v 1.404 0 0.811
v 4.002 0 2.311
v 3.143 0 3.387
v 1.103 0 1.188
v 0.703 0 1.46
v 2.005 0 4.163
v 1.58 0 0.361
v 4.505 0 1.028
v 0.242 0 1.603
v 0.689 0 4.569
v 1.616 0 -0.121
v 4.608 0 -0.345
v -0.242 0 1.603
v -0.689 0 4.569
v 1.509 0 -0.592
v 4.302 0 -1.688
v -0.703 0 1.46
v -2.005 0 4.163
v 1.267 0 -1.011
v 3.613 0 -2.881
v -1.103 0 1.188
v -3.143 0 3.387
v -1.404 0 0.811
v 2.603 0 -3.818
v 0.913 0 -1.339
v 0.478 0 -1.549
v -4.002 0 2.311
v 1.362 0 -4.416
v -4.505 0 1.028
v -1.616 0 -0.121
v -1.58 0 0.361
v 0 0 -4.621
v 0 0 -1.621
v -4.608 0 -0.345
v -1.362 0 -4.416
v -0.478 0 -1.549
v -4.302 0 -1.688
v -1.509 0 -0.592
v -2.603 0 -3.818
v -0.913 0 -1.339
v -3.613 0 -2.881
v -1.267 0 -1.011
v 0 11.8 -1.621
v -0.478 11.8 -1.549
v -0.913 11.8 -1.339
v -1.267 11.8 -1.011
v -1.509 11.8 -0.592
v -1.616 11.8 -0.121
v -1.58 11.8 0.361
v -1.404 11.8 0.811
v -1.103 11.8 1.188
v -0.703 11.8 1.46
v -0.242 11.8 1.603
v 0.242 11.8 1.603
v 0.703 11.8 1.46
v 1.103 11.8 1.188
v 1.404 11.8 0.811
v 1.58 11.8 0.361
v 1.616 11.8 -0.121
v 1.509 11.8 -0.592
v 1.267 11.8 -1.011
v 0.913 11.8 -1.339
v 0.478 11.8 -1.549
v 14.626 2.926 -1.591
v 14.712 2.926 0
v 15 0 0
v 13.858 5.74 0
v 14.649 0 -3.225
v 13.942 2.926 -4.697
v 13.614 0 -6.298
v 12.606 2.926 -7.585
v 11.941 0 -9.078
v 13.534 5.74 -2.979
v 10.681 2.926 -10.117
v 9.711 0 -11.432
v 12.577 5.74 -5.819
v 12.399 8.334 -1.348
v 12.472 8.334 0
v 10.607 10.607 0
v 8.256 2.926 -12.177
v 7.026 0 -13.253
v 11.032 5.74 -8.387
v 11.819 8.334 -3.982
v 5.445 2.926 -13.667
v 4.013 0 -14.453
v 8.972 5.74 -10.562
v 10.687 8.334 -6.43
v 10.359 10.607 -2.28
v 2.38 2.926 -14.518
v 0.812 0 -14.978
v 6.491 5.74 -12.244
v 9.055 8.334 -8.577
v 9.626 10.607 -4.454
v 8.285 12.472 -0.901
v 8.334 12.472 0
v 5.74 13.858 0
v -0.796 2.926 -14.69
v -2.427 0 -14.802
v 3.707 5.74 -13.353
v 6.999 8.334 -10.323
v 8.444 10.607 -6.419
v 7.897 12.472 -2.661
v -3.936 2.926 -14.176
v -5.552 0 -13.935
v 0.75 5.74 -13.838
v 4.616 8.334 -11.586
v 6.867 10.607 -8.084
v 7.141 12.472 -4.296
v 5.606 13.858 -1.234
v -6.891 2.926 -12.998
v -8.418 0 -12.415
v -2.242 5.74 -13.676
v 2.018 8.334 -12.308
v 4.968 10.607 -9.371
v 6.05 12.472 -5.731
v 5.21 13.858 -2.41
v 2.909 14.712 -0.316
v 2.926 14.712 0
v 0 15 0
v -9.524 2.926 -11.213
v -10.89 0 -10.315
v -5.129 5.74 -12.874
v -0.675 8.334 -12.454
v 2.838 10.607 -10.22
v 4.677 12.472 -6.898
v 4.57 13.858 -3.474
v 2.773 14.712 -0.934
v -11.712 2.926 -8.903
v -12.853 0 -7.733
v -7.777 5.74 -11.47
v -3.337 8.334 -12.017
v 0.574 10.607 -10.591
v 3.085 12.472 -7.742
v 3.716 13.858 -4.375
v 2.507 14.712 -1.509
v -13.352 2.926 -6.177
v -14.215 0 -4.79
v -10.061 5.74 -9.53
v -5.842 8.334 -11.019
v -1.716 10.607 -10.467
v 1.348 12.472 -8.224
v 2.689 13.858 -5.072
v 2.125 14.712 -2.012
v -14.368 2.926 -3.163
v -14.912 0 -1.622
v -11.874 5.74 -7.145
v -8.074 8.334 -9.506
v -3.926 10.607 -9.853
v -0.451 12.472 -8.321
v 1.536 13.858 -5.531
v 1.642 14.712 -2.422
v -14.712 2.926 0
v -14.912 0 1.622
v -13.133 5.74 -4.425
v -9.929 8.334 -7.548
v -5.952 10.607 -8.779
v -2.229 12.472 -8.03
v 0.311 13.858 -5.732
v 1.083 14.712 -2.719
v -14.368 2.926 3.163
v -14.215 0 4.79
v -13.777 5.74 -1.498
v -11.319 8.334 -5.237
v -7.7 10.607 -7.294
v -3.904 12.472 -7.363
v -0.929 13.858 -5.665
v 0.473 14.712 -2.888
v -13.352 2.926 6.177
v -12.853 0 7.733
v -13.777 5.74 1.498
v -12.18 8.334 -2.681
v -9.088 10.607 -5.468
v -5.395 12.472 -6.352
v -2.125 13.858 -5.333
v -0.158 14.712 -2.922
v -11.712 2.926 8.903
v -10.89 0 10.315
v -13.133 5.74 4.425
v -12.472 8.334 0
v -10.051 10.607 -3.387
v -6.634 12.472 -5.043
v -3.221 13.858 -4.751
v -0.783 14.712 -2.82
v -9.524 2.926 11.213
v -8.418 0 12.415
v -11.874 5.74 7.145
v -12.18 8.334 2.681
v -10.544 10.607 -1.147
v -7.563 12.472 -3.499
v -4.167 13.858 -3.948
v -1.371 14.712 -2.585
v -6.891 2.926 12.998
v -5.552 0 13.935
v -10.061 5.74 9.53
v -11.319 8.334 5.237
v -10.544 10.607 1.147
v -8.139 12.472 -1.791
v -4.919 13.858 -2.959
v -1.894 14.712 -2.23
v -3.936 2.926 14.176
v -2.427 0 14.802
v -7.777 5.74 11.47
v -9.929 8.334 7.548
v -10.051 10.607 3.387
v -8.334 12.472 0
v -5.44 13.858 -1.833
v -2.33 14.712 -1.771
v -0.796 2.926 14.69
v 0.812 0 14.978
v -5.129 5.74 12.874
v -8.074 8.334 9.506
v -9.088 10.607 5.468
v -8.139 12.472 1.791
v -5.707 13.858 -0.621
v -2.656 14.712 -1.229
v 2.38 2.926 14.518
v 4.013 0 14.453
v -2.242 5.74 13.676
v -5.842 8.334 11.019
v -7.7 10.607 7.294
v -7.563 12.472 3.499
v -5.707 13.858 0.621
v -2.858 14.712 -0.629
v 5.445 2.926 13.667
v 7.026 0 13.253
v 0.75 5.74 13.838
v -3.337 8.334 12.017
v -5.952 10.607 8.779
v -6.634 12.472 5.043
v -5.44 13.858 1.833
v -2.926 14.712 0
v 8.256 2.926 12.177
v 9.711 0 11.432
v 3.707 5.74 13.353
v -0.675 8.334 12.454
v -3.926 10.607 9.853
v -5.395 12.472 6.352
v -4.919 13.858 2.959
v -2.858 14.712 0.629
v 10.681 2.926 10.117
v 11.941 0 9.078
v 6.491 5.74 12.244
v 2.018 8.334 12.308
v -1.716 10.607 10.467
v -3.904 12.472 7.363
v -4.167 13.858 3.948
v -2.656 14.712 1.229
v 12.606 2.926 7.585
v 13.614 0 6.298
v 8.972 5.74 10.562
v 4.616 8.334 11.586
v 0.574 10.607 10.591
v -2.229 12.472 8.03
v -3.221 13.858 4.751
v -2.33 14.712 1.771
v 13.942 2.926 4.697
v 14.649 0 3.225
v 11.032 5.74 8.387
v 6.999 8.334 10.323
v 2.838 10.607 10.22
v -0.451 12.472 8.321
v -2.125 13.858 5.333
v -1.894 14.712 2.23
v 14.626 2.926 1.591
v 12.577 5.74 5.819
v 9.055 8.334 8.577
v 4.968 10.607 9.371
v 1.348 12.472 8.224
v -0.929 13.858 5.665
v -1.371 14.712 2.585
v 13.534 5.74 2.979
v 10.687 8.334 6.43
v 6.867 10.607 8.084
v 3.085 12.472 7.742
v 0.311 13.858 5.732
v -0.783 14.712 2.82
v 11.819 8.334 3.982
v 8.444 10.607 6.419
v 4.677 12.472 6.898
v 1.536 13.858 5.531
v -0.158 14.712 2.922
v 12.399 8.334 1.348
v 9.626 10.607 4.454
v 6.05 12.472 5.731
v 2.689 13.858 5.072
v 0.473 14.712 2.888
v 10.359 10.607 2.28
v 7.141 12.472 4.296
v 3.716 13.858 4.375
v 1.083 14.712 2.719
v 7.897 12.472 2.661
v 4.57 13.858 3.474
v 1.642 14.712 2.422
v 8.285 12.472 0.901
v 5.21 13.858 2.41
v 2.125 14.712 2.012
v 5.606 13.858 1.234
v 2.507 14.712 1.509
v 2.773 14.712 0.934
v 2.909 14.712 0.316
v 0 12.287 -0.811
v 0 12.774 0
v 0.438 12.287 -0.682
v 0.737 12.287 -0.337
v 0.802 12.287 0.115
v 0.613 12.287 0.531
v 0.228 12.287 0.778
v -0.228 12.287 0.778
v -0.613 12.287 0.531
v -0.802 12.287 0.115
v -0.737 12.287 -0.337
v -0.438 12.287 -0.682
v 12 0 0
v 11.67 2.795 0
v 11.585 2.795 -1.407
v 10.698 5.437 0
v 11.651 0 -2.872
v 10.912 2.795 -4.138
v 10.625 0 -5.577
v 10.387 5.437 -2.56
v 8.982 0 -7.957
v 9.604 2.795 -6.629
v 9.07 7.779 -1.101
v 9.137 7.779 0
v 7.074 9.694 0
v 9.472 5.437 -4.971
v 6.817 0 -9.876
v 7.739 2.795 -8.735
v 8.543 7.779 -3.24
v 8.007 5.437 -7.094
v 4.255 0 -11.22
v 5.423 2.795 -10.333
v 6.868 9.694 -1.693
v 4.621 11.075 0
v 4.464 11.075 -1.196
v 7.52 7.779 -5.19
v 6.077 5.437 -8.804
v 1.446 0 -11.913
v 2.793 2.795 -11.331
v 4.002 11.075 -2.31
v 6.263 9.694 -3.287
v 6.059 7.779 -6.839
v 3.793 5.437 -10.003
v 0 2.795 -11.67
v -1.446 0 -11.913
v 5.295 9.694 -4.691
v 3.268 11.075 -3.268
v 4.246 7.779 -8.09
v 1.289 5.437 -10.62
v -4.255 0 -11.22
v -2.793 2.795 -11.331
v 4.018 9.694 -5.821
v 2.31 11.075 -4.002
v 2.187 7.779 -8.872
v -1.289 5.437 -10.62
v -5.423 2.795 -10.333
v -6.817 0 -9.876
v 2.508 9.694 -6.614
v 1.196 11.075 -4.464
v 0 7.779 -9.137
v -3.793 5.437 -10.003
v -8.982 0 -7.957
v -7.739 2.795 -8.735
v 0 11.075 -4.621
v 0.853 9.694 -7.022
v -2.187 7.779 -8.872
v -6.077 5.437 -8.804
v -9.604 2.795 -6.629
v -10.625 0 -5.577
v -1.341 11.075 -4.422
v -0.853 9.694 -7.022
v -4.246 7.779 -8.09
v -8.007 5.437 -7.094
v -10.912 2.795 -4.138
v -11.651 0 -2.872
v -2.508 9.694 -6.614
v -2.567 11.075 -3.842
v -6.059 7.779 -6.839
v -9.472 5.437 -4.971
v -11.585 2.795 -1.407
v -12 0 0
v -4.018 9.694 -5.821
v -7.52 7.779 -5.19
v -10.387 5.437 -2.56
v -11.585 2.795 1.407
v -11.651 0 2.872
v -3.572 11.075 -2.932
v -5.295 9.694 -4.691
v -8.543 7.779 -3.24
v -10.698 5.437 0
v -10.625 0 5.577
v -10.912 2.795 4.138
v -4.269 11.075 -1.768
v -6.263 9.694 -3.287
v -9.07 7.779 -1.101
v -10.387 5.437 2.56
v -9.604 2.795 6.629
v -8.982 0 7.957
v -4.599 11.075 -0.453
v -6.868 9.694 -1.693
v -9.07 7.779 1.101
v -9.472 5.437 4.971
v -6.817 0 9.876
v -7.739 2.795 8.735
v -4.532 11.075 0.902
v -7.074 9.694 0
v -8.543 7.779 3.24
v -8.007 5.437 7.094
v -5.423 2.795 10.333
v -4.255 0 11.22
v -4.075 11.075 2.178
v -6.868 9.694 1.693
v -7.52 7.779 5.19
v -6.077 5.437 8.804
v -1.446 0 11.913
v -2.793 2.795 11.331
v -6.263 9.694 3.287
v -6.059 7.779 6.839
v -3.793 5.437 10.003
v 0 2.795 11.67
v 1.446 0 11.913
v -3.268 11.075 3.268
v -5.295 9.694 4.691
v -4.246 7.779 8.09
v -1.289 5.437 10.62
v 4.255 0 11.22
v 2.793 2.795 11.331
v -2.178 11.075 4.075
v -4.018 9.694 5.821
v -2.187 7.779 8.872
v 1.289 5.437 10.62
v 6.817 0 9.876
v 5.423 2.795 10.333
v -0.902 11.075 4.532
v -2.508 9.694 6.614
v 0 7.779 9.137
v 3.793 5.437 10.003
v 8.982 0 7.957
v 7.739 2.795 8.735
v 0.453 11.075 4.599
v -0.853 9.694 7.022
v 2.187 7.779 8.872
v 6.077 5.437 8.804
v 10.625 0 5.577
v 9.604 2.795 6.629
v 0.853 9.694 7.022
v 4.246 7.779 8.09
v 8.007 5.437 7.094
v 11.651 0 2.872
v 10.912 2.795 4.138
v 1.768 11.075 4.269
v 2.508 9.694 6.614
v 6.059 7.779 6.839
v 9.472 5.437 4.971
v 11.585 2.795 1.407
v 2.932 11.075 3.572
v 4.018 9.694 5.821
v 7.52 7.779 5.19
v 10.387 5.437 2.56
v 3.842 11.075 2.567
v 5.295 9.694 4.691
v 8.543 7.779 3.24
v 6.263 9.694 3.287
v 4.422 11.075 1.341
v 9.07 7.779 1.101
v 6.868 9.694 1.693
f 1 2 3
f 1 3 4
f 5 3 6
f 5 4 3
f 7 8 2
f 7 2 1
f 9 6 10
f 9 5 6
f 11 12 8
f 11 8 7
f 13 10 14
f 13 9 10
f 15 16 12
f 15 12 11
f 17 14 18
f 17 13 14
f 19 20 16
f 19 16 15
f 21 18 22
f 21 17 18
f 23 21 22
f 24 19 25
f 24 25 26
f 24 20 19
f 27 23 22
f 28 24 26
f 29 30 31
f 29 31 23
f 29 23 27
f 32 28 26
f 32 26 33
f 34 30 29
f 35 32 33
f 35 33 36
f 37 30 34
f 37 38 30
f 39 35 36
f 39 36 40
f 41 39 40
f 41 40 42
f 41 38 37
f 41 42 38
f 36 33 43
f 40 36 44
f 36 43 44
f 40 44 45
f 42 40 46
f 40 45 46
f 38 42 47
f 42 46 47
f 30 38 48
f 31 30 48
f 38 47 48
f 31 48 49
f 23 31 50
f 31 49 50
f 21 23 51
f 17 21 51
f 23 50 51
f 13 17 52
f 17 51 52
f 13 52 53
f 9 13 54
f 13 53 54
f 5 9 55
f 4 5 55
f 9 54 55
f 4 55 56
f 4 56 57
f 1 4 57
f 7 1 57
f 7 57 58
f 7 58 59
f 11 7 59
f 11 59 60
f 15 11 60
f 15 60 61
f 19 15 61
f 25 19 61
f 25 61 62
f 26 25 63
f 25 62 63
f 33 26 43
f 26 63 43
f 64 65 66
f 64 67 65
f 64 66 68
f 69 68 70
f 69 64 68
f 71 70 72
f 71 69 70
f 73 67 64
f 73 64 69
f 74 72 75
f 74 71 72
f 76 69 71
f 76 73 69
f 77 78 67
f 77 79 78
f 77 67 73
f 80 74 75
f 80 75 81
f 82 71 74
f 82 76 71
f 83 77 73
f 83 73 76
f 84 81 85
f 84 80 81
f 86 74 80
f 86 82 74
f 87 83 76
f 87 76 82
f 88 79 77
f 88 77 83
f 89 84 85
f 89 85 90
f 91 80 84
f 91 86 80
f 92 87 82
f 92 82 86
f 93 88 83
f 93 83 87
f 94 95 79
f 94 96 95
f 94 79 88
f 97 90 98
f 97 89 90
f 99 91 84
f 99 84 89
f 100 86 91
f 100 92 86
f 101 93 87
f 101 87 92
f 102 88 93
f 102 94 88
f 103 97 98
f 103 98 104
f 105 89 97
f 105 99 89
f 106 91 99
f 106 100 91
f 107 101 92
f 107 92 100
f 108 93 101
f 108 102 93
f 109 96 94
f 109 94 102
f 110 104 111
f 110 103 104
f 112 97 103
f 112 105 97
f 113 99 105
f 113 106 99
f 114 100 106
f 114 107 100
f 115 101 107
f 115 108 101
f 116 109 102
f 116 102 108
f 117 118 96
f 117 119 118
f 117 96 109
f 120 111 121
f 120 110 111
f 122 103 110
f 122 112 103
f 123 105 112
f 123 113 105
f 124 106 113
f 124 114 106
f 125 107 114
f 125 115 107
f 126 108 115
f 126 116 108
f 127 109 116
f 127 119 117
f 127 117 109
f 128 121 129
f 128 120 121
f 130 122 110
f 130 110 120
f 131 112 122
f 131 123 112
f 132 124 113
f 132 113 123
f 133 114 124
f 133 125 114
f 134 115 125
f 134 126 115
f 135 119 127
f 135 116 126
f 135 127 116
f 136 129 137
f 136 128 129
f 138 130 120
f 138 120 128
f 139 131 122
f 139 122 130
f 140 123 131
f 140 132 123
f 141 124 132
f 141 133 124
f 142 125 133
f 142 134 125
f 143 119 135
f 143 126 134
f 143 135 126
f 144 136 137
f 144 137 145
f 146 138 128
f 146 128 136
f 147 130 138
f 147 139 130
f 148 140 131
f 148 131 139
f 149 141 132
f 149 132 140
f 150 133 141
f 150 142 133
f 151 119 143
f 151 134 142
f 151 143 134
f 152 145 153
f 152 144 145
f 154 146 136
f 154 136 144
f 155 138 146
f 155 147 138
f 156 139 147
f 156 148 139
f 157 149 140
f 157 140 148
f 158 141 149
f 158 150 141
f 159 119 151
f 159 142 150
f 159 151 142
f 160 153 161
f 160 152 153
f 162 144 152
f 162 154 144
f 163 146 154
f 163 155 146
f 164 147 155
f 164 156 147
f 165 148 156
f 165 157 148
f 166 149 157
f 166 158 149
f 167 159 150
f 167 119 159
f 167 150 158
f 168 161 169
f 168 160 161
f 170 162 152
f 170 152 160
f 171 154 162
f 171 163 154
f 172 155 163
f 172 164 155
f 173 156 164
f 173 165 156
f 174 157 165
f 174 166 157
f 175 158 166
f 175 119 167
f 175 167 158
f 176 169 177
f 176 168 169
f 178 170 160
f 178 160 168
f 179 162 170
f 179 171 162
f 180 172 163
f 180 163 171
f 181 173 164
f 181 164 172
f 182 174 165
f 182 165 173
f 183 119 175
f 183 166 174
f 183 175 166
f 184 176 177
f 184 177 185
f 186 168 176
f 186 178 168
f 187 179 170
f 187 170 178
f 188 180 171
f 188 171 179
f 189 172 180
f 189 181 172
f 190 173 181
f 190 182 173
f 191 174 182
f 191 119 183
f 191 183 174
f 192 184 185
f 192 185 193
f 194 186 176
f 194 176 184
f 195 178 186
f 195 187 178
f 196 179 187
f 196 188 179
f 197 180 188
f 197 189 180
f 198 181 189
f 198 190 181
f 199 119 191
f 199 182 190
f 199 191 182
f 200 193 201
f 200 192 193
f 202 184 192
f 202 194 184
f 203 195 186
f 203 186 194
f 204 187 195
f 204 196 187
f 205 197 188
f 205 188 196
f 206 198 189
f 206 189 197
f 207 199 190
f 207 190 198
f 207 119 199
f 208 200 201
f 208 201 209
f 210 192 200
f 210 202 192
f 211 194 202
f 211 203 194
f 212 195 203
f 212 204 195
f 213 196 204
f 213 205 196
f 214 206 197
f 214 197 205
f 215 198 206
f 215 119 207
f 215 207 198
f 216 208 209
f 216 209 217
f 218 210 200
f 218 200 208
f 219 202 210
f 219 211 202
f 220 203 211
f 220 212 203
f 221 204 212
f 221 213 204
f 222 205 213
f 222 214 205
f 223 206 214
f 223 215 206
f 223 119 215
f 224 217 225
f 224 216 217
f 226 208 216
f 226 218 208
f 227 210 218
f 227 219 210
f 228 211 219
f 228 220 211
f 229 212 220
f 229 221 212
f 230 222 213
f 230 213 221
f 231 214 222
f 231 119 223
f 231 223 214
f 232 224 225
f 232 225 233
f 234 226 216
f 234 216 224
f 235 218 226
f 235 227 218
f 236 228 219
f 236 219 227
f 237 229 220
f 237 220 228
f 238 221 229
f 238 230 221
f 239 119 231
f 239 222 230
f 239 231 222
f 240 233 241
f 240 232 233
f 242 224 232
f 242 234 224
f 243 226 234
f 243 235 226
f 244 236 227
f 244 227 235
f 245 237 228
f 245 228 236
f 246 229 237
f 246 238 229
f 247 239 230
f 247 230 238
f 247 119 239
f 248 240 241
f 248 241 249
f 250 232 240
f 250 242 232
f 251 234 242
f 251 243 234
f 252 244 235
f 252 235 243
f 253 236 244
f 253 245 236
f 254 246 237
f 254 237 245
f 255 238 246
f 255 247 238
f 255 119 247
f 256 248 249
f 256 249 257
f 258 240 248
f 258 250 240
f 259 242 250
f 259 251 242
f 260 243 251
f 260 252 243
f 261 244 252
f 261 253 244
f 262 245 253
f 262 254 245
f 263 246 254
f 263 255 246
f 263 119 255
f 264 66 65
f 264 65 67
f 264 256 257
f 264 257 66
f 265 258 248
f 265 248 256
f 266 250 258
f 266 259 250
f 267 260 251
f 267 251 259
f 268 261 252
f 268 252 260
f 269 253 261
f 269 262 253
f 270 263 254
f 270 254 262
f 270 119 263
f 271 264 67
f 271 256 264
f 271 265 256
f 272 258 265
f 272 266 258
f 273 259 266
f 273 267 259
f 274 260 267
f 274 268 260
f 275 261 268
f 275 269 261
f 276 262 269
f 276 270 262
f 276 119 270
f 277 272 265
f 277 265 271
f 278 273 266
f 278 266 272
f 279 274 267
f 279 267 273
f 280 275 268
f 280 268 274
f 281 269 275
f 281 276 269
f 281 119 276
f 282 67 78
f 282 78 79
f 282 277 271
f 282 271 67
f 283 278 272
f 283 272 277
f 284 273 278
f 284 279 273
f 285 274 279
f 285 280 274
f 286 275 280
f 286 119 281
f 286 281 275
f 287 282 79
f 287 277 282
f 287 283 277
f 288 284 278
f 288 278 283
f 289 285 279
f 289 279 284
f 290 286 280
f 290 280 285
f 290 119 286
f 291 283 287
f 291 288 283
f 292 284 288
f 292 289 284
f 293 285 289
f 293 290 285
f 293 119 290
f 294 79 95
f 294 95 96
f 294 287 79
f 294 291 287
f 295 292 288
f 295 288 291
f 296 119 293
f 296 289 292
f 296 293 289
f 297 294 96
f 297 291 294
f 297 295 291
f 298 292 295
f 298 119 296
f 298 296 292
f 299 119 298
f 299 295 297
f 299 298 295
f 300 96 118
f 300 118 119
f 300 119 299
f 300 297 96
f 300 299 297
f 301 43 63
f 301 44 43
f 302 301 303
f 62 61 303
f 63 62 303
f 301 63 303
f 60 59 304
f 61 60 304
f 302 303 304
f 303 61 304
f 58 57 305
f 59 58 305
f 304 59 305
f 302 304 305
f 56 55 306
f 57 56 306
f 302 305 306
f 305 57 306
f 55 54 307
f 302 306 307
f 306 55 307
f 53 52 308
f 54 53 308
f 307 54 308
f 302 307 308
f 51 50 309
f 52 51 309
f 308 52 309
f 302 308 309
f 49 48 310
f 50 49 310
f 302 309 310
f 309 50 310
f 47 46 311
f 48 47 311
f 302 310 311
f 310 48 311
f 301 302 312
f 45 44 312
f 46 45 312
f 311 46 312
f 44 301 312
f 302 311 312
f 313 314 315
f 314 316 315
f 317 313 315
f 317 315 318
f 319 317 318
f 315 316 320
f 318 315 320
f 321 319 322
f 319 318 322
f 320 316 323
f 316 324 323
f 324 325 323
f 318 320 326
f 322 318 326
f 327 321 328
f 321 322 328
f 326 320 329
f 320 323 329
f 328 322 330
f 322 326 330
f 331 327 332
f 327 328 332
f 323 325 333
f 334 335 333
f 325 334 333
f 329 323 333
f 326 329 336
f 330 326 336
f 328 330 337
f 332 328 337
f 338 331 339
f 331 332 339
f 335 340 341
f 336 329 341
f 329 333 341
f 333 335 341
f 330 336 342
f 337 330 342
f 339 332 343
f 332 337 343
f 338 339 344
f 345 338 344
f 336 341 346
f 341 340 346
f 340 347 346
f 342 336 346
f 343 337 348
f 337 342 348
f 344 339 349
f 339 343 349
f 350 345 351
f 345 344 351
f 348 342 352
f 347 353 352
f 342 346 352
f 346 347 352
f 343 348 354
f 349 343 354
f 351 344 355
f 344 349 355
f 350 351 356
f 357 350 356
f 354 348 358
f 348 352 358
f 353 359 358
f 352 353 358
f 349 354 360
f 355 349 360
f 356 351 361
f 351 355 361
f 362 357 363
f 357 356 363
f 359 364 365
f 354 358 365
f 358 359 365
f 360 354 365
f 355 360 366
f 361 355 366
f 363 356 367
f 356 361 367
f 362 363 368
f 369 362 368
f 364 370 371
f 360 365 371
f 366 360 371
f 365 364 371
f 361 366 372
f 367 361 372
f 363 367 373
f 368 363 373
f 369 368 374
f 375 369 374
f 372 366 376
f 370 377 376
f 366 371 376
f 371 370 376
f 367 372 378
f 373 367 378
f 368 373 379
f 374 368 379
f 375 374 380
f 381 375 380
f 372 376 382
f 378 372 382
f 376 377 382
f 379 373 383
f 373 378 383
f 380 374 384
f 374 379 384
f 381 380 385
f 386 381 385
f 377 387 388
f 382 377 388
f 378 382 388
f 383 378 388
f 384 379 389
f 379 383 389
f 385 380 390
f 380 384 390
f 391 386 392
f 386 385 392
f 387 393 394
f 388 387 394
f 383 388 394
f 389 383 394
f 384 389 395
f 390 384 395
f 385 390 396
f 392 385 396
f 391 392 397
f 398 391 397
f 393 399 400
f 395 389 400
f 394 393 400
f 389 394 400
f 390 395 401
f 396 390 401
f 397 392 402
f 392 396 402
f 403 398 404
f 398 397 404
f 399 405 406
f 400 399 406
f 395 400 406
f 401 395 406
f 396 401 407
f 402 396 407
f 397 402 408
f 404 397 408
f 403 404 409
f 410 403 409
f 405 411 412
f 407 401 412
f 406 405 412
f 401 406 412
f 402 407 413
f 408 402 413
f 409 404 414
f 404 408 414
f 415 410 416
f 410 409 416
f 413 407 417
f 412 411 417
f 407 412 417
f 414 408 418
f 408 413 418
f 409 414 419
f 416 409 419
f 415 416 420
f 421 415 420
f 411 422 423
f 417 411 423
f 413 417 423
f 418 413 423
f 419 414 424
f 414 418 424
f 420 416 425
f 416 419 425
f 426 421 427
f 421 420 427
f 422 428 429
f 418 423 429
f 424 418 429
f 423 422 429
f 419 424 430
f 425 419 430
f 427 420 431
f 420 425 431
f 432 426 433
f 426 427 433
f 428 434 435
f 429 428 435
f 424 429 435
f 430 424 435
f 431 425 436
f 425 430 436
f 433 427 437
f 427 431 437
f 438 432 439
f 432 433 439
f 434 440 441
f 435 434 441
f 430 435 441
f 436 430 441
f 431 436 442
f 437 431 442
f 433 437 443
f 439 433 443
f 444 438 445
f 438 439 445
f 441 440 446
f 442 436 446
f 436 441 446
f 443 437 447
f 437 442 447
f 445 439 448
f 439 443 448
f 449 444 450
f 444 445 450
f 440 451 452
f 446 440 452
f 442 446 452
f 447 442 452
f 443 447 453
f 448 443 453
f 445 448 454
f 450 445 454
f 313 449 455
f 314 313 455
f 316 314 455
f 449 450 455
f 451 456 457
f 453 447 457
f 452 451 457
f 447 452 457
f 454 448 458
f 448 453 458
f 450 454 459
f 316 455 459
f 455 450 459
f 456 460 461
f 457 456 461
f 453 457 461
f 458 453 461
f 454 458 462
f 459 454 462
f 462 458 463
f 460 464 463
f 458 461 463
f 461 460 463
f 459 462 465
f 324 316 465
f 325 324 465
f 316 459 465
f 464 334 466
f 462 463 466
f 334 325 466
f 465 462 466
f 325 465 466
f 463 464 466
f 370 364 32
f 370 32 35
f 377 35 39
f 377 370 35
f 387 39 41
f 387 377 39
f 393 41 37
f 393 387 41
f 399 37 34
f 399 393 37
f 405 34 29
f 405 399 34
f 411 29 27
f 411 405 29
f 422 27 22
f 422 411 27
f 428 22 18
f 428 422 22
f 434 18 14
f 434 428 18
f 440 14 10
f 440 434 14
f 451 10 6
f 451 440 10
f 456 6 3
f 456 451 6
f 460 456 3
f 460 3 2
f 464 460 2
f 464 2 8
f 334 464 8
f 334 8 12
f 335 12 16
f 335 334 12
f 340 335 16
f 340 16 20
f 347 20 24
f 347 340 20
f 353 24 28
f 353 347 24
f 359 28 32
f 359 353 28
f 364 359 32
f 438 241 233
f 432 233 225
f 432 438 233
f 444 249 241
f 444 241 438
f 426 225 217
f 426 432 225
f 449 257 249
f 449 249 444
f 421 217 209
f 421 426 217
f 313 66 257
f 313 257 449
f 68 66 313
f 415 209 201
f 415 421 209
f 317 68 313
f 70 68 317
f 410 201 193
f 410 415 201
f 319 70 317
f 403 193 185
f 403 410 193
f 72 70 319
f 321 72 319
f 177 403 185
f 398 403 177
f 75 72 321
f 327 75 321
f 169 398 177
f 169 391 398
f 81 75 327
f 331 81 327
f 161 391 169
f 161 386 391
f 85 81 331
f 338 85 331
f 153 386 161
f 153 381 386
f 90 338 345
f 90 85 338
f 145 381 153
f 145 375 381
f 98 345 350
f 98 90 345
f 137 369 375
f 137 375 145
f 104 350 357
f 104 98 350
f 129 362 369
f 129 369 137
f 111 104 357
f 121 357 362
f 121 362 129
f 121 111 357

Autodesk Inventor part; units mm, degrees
ref_plane "YZ Plane" through (0, 0, 0) normal (1, 0, 0) x (0, 1, 0)
ref_plane "XZ Plane" through (0, 0, 0) normal (0, 1, 0) x (-1, 0, 0)
ref_plane "XY Plane" through (0, 0, 0) normal (0, 0, 1) x (1, 0, 0)
sketch "Sketch1" plane through (0, 0, 0) normal (0, 0, 1) x (1, 0, 0)
  line L0 (0, 0) -> (0, 15)
  line L1 (0, 0) -> (15, 0)
  arc A0 (15, 0) -> (0, 15) centre (0, 0) ccw
  line L2 (0, -3.6213) -> (0, 21.7279) projected
  dimension "d2" = 15
revolve "Revolution1" add sketch "Sketch1" angle 360 about axis through (0, -10, 0) along (0, 1, 0)
sketch "Sketch4" plane through (0, 0, 0) normal (0, -1, 0) x (1, 0, 0)
  point P0 (0, 0)
  point P1 (0, 0)
hole "Hole2" at (0, 0, 0) direction (0, 1, 0) diameter 3.242 depth 11.8 tip angle 118 thread size "M4x0.7" class "6H" standard "ANSI Metric M Profile"
shell "Shell2" thickness 3 removed faces 1 at (10.3911, 0, 1.2617)
properties part number "Ball_Upper Half" material "Nylon 6/6"
